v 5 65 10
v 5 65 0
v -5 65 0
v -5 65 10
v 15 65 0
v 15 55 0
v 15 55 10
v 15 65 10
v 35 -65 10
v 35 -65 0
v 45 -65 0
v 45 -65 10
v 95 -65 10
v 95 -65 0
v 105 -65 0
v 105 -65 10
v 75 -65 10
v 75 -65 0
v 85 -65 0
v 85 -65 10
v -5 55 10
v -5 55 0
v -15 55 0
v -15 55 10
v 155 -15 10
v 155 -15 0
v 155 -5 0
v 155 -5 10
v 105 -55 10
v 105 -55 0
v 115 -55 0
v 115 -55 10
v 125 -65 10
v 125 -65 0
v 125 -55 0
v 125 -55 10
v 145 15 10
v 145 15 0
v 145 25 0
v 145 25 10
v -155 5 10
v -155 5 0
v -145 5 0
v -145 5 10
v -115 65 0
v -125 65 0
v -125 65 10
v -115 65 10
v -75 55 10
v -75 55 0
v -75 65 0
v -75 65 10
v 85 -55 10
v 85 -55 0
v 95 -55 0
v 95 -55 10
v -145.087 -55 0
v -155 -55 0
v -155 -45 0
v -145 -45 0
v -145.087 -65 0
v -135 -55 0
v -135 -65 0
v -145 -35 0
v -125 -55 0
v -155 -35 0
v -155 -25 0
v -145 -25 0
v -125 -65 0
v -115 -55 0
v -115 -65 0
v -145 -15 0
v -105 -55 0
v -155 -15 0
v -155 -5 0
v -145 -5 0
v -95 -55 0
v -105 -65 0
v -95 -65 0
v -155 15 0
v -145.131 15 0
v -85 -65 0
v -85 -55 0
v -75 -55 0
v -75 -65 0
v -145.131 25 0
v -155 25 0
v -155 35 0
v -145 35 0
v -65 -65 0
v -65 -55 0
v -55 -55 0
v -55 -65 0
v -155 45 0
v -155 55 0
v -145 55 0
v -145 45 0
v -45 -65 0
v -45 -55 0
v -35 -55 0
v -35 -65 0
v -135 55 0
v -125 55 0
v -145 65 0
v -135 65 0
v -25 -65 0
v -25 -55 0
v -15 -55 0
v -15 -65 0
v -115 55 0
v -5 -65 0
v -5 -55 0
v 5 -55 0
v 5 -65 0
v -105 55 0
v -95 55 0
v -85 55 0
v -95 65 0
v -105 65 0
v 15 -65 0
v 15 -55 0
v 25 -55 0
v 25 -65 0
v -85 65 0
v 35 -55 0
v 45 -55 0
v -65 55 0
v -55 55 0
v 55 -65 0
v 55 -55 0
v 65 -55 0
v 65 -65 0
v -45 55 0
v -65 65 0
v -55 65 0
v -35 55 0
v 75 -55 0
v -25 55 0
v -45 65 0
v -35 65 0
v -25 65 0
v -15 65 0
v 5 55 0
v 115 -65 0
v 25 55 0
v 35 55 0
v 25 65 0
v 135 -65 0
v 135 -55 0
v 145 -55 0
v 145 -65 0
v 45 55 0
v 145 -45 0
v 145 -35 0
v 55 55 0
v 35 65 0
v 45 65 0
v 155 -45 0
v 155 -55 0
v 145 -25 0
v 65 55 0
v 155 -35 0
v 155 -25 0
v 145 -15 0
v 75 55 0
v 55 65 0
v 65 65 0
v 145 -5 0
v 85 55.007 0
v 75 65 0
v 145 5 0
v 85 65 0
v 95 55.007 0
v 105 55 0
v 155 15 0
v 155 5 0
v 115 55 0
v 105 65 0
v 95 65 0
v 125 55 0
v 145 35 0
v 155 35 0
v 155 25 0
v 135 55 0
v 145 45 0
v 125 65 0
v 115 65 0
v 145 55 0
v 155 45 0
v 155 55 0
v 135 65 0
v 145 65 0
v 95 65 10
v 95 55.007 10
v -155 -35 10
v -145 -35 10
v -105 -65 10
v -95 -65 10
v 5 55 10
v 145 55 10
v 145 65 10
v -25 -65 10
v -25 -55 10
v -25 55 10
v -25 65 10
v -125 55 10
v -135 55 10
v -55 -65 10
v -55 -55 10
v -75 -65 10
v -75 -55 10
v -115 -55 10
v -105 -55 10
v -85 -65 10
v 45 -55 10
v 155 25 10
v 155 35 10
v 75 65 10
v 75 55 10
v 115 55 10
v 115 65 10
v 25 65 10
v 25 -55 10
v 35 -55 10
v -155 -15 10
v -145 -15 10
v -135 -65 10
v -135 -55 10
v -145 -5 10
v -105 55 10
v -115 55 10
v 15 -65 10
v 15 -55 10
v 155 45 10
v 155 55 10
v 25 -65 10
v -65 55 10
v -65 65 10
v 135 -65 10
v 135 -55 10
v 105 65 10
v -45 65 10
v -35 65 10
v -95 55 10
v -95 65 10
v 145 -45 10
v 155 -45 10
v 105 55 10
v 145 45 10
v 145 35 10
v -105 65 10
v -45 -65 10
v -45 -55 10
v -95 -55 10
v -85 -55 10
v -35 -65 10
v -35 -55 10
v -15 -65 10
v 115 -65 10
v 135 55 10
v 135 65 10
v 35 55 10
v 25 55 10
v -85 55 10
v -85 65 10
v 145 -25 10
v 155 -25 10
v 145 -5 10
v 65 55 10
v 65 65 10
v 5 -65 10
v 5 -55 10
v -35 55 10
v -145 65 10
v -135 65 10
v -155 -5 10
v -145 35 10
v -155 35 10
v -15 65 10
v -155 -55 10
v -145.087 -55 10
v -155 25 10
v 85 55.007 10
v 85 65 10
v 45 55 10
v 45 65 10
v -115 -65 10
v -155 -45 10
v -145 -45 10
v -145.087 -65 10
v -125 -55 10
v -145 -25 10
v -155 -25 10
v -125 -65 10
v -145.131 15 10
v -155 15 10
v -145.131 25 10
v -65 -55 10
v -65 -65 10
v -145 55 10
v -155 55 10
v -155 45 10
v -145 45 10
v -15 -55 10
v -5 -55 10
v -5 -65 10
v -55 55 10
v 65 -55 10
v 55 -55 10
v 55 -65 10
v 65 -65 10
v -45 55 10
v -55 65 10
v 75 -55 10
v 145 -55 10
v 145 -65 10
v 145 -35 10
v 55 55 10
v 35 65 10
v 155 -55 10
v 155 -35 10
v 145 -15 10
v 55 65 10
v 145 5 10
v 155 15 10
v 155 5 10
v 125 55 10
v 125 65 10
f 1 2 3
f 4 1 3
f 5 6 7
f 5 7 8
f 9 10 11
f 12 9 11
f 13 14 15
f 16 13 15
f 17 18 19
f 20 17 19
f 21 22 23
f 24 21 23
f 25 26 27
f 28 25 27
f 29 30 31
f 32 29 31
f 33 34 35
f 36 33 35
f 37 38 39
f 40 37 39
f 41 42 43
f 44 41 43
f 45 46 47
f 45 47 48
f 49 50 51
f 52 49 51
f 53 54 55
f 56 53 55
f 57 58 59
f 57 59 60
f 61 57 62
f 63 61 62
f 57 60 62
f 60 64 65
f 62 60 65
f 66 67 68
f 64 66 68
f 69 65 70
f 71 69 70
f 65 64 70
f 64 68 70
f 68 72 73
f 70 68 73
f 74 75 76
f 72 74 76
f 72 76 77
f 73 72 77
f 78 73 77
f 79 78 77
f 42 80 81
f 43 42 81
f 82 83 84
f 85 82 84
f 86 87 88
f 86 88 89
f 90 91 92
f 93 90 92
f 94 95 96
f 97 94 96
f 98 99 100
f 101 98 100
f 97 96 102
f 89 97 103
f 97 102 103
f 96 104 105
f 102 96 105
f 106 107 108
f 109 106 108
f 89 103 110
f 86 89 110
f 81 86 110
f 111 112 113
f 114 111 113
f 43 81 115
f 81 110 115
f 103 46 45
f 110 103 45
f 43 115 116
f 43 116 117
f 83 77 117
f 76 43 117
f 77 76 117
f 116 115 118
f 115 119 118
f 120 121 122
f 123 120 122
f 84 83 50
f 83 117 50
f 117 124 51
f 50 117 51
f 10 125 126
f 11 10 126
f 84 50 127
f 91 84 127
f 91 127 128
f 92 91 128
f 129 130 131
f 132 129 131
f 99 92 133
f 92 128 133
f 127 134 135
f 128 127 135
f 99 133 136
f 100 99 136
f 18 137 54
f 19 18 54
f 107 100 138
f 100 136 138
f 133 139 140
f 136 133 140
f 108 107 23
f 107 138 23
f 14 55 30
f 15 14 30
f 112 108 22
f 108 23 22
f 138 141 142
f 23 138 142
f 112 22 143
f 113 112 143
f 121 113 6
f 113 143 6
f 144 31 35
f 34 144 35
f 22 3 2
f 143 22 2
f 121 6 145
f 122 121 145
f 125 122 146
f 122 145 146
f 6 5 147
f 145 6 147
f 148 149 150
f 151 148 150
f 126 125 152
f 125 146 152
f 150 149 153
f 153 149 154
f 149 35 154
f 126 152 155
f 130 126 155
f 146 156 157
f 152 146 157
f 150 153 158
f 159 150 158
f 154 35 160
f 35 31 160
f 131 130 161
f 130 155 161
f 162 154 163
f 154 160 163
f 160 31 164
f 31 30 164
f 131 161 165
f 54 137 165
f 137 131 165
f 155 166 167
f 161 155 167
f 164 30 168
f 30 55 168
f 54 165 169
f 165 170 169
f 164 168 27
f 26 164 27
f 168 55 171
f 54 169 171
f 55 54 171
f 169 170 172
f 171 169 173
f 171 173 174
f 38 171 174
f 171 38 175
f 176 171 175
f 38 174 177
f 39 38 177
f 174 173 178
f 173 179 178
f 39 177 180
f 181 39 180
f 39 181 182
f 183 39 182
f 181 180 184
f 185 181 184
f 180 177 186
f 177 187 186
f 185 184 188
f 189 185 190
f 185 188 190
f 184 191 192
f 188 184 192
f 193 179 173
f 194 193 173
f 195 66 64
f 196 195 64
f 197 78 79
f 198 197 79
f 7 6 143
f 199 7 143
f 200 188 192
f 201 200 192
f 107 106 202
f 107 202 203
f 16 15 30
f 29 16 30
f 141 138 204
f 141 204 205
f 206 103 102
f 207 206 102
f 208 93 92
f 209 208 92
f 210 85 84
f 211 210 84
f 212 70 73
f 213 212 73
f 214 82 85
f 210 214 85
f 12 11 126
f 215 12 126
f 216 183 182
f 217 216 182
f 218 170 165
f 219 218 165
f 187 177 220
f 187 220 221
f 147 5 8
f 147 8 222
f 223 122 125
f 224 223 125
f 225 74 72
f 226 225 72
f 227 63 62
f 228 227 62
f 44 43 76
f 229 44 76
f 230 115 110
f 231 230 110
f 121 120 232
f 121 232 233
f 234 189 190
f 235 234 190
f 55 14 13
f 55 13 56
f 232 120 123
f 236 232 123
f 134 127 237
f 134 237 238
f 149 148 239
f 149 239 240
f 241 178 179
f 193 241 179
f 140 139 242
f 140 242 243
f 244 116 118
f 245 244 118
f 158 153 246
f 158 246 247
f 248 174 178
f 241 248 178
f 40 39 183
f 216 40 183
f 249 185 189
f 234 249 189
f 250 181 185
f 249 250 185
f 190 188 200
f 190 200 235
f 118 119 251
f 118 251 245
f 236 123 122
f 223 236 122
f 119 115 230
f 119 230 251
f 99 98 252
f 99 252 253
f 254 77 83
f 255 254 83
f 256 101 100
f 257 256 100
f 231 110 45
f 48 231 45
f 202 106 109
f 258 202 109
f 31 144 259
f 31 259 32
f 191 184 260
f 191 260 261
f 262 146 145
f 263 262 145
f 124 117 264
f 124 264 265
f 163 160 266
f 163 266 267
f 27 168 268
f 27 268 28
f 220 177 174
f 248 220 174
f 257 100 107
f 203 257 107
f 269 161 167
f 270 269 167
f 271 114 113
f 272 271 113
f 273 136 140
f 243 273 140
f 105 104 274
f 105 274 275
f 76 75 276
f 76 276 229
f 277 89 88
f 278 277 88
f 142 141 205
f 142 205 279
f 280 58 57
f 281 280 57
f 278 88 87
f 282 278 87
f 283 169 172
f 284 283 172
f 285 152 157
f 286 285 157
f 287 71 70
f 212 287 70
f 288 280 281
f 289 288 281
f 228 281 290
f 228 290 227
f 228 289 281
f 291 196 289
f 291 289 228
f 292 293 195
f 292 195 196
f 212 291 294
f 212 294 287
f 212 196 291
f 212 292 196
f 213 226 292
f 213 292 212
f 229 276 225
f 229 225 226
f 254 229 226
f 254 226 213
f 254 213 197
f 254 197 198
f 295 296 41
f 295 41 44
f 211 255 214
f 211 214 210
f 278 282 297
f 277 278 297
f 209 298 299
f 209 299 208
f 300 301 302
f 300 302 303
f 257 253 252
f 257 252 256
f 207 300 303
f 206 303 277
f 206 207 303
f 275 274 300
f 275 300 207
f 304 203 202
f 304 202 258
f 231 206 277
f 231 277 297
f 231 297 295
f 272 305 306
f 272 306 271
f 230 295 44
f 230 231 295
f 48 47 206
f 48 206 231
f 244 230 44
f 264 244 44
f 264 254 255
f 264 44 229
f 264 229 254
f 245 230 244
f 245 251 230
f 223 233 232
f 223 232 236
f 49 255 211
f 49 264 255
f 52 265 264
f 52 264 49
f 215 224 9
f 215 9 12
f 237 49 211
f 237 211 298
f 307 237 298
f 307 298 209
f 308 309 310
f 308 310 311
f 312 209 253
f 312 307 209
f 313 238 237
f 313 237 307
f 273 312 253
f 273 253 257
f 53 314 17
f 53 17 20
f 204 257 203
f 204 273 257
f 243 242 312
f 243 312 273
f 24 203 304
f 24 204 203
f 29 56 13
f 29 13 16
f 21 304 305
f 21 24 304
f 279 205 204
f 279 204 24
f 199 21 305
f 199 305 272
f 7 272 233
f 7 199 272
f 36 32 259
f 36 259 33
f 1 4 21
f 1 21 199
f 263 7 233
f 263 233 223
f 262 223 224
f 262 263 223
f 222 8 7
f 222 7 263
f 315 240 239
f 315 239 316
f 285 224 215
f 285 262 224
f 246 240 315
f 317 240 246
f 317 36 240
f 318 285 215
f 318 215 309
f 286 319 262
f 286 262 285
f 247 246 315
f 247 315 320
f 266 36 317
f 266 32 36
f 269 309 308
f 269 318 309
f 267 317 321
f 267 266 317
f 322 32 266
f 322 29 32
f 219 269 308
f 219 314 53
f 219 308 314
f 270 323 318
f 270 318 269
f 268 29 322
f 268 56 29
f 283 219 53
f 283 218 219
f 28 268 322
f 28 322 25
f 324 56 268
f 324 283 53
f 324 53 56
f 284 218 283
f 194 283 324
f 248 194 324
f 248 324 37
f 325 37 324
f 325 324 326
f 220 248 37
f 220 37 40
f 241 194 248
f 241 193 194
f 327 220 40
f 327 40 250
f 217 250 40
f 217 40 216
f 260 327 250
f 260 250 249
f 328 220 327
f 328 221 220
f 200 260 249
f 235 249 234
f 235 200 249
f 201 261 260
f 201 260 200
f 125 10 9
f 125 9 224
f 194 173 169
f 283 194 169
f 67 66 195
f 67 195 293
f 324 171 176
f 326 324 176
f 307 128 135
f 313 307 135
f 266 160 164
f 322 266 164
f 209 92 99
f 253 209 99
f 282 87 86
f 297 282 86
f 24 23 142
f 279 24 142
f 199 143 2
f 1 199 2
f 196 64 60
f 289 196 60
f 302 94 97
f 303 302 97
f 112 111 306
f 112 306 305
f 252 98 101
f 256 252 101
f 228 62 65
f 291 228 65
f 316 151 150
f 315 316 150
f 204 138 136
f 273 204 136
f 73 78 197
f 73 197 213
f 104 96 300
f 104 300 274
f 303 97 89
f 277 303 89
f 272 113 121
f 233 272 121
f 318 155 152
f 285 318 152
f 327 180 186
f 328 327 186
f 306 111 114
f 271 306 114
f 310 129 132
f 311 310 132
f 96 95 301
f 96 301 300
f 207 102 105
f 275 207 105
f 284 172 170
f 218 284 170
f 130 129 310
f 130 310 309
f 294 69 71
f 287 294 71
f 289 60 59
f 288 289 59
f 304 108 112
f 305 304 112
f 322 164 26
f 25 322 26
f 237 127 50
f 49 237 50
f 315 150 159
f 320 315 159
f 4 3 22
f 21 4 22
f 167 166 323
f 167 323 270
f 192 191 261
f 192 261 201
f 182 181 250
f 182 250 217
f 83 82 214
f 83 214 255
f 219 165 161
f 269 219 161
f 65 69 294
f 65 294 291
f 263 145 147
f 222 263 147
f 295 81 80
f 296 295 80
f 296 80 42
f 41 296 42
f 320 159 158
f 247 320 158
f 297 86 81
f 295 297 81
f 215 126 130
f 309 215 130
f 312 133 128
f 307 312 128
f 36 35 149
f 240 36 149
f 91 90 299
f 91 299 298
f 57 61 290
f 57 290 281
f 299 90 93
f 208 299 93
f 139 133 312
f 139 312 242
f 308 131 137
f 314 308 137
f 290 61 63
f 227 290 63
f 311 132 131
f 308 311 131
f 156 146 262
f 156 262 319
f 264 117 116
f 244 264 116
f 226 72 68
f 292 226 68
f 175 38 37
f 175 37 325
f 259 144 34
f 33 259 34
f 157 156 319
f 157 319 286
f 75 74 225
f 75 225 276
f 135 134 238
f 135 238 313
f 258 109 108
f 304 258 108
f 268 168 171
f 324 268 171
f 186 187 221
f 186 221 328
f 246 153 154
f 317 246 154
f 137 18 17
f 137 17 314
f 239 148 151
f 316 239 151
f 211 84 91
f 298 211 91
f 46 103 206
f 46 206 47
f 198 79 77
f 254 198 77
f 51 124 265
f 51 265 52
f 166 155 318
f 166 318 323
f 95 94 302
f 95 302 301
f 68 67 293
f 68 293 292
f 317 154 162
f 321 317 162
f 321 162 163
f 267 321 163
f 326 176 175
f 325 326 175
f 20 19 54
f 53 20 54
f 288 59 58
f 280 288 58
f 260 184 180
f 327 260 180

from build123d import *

# Parameters (mm, degrees)
F0_W     = 10
F0_H     = 10
F0_W_2   = 0.086959
F1_DEPTH = 10


with BuildPart() as f1:
    # F0 (on Top) → F1 (new body)
    with BuildSketch(Plane.XY):
        with Locations((-140, -60)):
            Rectangle(F0_W, F0_H)
        with Locations((-150, 50)):
            Rectangle(F0_W, F0_H)
        Polygon((-155, 25), (-145.130813, 25), (-145, 25), (-145, 35), (-155, 35), align=None)
        Polygon((-155, 5), (-145, 5), (-145, 15), (-145.130813, 15), (-155, 15), align=None)
        with Locations((-150, -10)):
            Rectangle(F0_W, F0_H)
        with Locations((-150, -30)):
            Rectangle(F0_W, F0_H)
        Polygon((-155, -55), (-145.086959, -55), (-145, -55), (-145, -45), (-155, -45), align=None)
        with Locations((150, -50)):
            Rectangle(F0_W, F0_H)
        with Locations((-140, 60)):
            Rectangle(F0_W, F0_H)
        with Locations((-120, 60)):
            Rectangle(F0_W, F0_H)
        with Locations((-100, 60)):
            Rectangle(F0_W, F0_H)
        with Locations((-80, 60)):
            Rectangle(F0_W, F0_H)
        with Locations((-60, 60)):
            Rectangle(F0_W, F0_H)
        with Locations((-40, 60)):
            Rectangle(F0_W, F0_H)
        with Locations((-20, 60)):
            Rectangle(F0_W, F0_H)
        Polygon((-5, 65), (-5, 55), (-5, 54.502327), (5, 54.502327), (5, 55), (5, 65), align=None)
        with Locations((20, 60)):
            Rectangle(F0_W, F0_H)
        with Locations((40, 60)):
            Rectangle(F0_W, F0_H)
        with Locations((60, 60)):
            Rectangle(F0_W, F0_H)
        Polygon((75, 65), (75, 55), (85, 55), (85, 55.006977), (85, 65), align=None)
        Polygon((95, 65), (95, 55.006977), (95, 55), (105, 55), (105, 65), align=None)
        with Locations((120, 60)):
            Rectangle(F0_W, F0_H)
        with Locations((140, 60)):
            Rectangle(F0_W, F0_H)
        with Locations((-120, -60)):
            Rectangle(F0_W, F0_H)
        with Locations((-100, -60)):
            Rectangle(F0_W, F0_H)
        with Locations((-80, -60)):
            Rectangle(F0_W, F0_H)
        with Locations((-60, -60)):
            Rectangle(F0_W, F0_H)
        with Locations((-40, -60)):
            Rectangle(F0_W, F0_H)
        with Locations((-20, -60)):
            Rectangle(F0_W, F0_H)
        with Locations((0, -60)):
            Rectangle(F0_W, F0_H)
        with Locations((20, -60)):
            Rectangle(F0_W, F0_H)
        with Locations((40, -60)):
            Rectangle(F0_W, F0_H)
        with Locations((60, -60)):
            Rectangle(F0_W, F0_H)
        with Locations((80, -60)):
            Rectangle(F0_W, F0_H)
        with Locations((100, -60)):
            Rectangle(F0_W, F0_H)
        with Locations((120, -60)):
            Rectangle(F0_W, F0_H)
        with Locations((140, -60)):
            Rectangle(F0_W, F0_H)
        with Locations((150, 50)):
            Rectangle(F0_W, F0_H)
        with Locations((150, 30)):
            Rectangle(F0_W, F0_H)
        with Locations((150, 10)):
            Rectangle(F0_W, F0_H)
        with Locations((150, -10)):
            Rectangle(F0_W, F0_H)
        with Locations((150, -30)):
            Rectangle(F0_W, F0_H)
        Polygon((-145, -45), (-145, -55), (-135, -55), (-125, -55), (-115, -55), (-105, -55), (-95, -55), (-85, -55), (-75, -55), (-65, -55), (-55, -55), (-45, -55), (-35, -55), (-25, -55), (-15, -55), (-5, -55), (5, -55), (15, -55), (25, -55), (35, -55), (45, -55), (55, -55), (65, -55), (75, -55), (85, -55), (95, -55), (105, -55), (115, -55), (125, -55), (135, -55), (145, -55), (145, -45), (145, -35), (145, -25), (145, -15), (145, -5), (145, 5), (145, 15), (145, 25), (145, 35), (145, 45), (145, 55), (135, 55), (125, 55), (115, 55), (105, 55), (95, 55), (95, 55.006977), (85, 55.006977), (85, 55), (75, 55), (65, 55), (55, 55), (45, 55), (35, 55), (25, 55), (15, 55), (5, 55), (5, 54.502327), (-5, 54.502327), (-5, 55), (-15, 55), (-25, 55), (-35, 55), (-45, 55), (-55, 55), (-65, 55), (-75, 55), (-85, 55), (-95, 55), (-105, 55), (-115, 55), (-125, 55), (-135, 55), (-145, 55), (-145, 45), (-145, 35), (-145, 25), (-145.130813, 25), (-145.130813, 15), (-145, 15), (-145, 5), (-145, -5), (-145, -15), (-145, -25), (-145, -35), align=None)
        with Locations((-145.043479, -60)):
            Rectangle(F0_W_2, F0_H)
    extrude(amount=F1_DEPTH)


solid = f1.part
